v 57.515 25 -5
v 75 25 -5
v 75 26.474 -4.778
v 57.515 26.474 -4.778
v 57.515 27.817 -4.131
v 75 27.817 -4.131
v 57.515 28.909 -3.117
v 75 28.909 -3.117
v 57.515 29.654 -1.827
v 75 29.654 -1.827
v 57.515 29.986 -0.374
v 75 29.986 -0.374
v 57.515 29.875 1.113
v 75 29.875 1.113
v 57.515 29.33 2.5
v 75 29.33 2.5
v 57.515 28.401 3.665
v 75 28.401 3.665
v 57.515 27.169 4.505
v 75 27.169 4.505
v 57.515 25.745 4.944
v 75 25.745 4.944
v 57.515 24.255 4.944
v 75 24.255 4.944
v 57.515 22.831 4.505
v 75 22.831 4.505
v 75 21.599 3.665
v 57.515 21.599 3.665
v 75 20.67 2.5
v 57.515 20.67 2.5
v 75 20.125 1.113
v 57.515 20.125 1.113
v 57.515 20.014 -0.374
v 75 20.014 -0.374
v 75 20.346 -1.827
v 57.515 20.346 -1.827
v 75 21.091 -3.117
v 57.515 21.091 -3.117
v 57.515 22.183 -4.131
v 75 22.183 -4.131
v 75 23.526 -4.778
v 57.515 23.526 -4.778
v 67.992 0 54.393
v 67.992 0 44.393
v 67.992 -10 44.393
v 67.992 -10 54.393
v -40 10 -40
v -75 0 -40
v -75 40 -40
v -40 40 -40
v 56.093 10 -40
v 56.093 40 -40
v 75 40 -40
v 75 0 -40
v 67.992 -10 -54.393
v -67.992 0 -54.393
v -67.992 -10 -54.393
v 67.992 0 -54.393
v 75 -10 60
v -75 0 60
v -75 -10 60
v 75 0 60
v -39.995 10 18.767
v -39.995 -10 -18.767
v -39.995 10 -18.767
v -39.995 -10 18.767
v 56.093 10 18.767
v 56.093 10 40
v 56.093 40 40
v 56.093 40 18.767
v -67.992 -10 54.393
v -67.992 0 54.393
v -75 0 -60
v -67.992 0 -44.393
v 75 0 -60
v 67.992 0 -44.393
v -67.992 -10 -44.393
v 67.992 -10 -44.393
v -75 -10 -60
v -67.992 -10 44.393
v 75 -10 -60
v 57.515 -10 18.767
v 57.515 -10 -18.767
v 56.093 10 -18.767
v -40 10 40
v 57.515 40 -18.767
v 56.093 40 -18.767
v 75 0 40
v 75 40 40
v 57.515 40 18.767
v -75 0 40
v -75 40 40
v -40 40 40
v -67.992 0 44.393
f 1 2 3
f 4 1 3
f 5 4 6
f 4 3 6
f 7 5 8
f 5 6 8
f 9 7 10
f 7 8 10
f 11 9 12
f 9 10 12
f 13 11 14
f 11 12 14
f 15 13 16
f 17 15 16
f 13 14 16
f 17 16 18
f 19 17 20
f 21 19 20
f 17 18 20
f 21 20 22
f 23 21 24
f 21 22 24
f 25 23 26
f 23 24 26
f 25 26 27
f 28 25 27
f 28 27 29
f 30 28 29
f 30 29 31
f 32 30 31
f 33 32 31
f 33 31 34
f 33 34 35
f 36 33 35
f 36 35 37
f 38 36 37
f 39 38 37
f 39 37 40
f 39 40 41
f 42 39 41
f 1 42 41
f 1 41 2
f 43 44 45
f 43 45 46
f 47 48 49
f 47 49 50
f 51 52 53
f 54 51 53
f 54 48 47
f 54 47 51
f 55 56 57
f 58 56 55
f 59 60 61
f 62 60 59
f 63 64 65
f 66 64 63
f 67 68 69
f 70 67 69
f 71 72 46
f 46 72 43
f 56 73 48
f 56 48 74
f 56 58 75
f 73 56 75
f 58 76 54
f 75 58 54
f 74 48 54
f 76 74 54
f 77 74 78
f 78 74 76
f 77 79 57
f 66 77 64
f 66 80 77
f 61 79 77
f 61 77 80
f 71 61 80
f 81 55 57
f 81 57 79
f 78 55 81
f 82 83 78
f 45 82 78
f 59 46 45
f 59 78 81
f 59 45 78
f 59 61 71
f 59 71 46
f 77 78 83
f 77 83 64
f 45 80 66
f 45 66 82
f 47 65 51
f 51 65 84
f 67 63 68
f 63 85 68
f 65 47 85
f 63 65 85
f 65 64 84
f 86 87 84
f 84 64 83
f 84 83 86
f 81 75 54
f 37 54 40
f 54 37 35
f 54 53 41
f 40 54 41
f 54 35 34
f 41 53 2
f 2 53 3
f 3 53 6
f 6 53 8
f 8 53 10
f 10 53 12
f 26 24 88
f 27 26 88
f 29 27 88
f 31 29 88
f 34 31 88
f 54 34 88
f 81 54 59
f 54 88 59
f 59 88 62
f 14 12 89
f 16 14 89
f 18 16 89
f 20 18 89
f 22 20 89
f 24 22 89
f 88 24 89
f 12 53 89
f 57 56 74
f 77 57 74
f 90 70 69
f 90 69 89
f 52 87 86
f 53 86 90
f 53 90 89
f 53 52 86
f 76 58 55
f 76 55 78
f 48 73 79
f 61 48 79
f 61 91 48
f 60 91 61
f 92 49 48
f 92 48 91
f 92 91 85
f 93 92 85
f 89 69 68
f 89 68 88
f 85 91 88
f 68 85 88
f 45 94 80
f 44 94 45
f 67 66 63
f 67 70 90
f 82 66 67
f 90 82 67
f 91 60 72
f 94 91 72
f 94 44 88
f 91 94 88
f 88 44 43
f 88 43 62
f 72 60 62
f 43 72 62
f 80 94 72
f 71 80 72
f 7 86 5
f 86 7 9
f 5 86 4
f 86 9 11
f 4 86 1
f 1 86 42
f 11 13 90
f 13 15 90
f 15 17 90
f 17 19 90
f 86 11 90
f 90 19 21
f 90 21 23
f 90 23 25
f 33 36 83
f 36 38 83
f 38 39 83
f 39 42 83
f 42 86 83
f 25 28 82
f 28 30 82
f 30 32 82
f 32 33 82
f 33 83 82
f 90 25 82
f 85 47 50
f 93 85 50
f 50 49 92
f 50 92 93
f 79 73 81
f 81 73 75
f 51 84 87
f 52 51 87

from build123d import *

# Parameters (mm, degrees)
SKETCH_1_W          = 150
SKETCH_1_H          = 80
EXTRUDE_1_DEPTH     = 40
SKETCH_2_W          = 150
SKETCH_2_H          = 120
SKETCH_2_W_2        = 135.983002124
SKETCH_2_H_2        = 10
EXTRUDE_2_DEPTH     = 10
SKETCH_3_W          = 96.092988376
SKETCH_3_H          = 30
CUT_EXTRUDE_1_DEPTH = 101
SKETCH_5_W          = 97.510223457
SKETCH_5_H          = 37.534840072
CUT_EXTRUDE_2_DEPTH = 51
SKETCH_6_R          = 5
CUT_EXTRUDE_3_DEPTH = 30


with BuildPart() as part:
    # Эскиз1 → Бобышка-Вытянуть1 (new body)
    with BuildSketch(Plane(origin=(0, 0, 0), x_dir=(1, 0, 0), z_dir=(0, 1, 0))):
        Rectangle(SKETCH_1_W, SKETCH_1_H)
    extrude(amount=EXTRUDE_1_DEPTH)

    # Эскиз2 → Бобышка-Вытянуть2 (add)
    with BuildSketch(Plane.XZ):
        Rectangle(SKETCH_2_W, SKETCH_2_H)
        with Locations((0, 49.39320085)):
            Rectangle(SKETCH_2_W_2, SKETCH_2_H_2, mode=Mode.SUBTRACT)
        with Locations((0, -49.39320085)):
            Rectangle(SKETCH_2_W_2, SKETCH_2_H_2, mode=Mode.SUBTRACT)
    extrude(amount=EXTRUDE_2_DEPTH)

    # Эскиз3 → Вырез-Вытянуть1 (cut, through all)
    with BuildSketch(Plane.XY.offset(40)):
        with Locations((8.046494188, 25)):
            Rectangle(SKETCH_3_W, SKETCH_3_H)
    extrude(amount=-CUT_EXTRUDE_1_DEPTH, mode=Mode.SUBTRACT)

    # Эскиз5 → Вырез-Вытянуть2 (cut, through all)
    with BuildSketch(Plane.XZ.offset(10)):
        with Locations((8.760111104, 0)):
            Rectangle(SKETCH_5_W, SKETCH_5_H)
    extrude(amount=-CUT_EXTRUDE_2_DEPTH, mode=Mode.SUBTRACT)

    # Эскиз6 → Вырез-Вытянуть3 (cut)
    with BuildSketch(Plane(origin=(75, 0, 0), x_dir=(0, 0, -1), z_dir=(1, 0, 0))):
        with Locations((0, 25)):
            Circle(SKETCH_6_R)
    extrude(amount=-CUT_EXTRUDE_3_DEPTH, mode=Mode.SUBTRACT)


solid = part.part
